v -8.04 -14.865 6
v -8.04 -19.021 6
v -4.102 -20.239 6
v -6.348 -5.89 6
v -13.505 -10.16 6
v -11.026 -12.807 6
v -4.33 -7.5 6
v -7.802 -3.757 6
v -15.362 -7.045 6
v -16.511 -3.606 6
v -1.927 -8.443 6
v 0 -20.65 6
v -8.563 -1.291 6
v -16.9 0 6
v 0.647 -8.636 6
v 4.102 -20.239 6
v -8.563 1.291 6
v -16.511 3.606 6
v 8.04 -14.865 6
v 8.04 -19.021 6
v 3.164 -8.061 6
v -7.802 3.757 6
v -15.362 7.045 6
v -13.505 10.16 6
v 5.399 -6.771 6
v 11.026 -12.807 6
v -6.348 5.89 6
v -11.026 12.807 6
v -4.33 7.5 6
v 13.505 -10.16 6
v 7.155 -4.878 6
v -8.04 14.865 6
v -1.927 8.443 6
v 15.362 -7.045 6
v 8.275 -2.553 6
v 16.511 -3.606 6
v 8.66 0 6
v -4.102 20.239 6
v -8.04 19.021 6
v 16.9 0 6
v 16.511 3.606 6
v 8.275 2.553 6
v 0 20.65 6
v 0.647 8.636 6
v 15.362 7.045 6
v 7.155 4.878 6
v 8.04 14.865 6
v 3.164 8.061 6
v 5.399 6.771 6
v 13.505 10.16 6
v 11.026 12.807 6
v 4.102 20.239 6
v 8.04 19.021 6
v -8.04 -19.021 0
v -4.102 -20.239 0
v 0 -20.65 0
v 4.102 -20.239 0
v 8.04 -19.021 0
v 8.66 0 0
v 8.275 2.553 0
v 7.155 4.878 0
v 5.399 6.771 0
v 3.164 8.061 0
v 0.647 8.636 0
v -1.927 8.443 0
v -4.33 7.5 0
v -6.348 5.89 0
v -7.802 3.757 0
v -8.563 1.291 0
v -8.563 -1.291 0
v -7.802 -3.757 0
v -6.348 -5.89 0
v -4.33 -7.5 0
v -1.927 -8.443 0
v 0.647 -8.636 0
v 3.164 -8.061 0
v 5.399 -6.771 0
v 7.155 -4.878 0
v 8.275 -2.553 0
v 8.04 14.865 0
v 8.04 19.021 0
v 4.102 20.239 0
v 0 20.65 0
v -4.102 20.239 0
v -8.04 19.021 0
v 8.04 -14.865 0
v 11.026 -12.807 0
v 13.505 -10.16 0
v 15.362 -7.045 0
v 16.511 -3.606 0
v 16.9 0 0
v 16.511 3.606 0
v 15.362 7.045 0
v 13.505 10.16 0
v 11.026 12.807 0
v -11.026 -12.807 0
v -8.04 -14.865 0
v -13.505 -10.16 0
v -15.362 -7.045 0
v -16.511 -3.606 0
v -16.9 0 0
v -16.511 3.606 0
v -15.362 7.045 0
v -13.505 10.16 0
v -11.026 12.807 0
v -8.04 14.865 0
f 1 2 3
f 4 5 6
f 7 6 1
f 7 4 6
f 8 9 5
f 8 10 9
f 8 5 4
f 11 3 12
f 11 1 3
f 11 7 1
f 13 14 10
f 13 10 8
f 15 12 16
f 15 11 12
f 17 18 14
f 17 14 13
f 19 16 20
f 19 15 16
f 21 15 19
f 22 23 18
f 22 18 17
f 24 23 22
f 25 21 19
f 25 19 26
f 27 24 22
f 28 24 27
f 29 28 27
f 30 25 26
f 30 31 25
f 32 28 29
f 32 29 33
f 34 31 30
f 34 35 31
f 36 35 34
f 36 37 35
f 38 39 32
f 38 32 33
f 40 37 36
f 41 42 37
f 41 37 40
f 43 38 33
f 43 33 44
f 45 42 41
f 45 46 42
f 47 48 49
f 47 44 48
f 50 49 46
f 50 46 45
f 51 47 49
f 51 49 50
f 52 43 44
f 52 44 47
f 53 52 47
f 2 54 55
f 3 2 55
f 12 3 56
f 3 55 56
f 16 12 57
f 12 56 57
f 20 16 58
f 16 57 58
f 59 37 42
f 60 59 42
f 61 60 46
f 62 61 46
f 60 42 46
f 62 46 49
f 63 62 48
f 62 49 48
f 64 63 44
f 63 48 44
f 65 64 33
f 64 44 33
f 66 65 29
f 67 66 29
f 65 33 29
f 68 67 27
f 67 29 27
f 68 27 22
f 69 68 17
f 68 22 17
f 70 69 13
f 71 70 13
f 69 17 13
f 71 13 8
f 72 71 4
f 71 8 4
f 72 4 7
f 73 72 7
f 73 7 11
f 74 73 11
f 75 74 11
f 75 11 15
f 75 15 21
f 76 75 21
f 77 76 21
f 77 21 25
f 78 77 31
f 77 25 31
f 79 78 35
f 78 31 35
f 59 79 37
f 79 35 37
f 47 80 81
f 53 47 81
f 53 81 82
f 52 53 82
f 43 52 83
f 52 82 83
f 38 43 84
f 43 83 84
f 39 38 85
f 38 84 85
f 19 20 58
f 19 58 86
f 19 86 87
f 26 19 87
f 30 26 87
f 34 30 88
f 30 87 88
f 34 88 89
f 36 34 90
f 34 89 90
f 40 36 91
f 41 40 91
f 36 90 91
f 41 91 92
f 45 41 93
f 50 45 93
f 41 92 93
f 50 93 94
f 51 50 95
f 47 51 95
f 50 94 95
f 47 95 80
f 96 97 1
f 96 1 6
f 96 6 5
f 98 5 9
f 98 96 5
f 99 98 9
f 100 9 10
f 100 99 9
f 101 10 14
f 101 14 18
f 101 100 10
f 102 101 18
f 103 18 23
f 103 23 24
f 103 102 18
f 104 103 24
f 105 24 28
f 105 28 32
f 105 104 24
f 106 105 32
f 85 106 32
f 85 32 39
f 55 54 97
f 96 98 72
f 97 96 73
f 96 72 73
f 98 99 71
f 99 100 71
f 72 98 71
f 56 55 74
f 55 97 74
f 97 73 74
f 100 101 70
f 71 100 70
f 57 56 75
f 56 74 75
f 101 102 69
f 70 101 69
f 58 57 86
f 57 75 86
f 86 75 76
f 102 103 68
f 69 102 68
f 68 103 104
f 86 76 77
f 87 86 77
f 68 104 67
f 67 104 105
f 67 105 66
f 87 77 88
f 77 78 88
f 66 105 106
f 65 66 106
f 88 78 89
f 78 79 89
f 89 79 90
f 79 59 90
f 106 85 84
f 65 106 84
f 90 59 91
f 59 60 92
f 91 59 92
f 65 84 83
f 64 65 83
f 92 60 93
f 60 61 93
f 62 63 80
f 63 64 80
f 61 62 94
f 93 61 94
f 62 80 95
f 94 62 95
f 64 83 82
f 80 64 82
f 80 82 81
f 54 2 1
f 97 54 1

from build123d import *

# Parameters (mm, degrees)
IZIM1_R                     = 20.65
Y_KSEKLIK_EKSTR_ZYON1_DEPTH = 6
KES_EKSTR_ZYON1_START       = -6
KES_EKSTR_ZYON1_DEPTH       = 6
IZIM4_R                     = 8.66
KES_EKSTR_ZYON2_DEPTH       = 6


with BuildPart() as part:
    # Çizim1 → Yükseklik-Ekstrüzyon1 (new body)
    with BuildSketch(Plane.XY):
        Circle(IZIM1_R)
    extrude(amount=Y_KSEKLIK_EKSTR_ZYON1_DEPTH)

    # Çizim3 → Kes-Ekstrüzyon1 (cut)
    with BuildSketch(Plane.XY.offset(6).offset(KES_EKSTR_ZYON1_START)):
        with BuildLine():
            Line((8.04, 14.865005886), (8.04, 19.020538899))
            ThreePointArc((8.04, 19.020538899), (20.65, 0), (8.04, -19.020538899))
            Line((8.04, -19.020538899), (8.04, -14.865005886))
            ThreePointArc((8.04, -14.865005886), (16.9, 0), (8.04, 14.865005886))
        make_face()
        with BuildLine():
            Line((-8.04, 14.865005886), (-8.04, 19.020538899))
            ThreePointArc((-8.04, 19.020538899), (-20.65, 0), (-8.04, -19.020538899))
            Line((-8.04, -19.020538899), (-8.04, -14.865005886))
            ThreePointArc((-8.04, -14.865005886), (-16.9, 0), (-8.04, 14.865005886))
        make_face()
    extrude(amount=KES_EKSTR_ZYON1_DEPTH, mode=Mode.SUBTRACT)

    # Çizim4 → Kes-Ekstrüzyon2 (cut)
    with BuildSketch(Plane.XY.offset(6)):
        Circle(IZIM4_R)
    extrude(amount=-KES_EKSTR_ZYON2_DEPTH, mode=Mode.SUBTRACT)


solid = part.part
